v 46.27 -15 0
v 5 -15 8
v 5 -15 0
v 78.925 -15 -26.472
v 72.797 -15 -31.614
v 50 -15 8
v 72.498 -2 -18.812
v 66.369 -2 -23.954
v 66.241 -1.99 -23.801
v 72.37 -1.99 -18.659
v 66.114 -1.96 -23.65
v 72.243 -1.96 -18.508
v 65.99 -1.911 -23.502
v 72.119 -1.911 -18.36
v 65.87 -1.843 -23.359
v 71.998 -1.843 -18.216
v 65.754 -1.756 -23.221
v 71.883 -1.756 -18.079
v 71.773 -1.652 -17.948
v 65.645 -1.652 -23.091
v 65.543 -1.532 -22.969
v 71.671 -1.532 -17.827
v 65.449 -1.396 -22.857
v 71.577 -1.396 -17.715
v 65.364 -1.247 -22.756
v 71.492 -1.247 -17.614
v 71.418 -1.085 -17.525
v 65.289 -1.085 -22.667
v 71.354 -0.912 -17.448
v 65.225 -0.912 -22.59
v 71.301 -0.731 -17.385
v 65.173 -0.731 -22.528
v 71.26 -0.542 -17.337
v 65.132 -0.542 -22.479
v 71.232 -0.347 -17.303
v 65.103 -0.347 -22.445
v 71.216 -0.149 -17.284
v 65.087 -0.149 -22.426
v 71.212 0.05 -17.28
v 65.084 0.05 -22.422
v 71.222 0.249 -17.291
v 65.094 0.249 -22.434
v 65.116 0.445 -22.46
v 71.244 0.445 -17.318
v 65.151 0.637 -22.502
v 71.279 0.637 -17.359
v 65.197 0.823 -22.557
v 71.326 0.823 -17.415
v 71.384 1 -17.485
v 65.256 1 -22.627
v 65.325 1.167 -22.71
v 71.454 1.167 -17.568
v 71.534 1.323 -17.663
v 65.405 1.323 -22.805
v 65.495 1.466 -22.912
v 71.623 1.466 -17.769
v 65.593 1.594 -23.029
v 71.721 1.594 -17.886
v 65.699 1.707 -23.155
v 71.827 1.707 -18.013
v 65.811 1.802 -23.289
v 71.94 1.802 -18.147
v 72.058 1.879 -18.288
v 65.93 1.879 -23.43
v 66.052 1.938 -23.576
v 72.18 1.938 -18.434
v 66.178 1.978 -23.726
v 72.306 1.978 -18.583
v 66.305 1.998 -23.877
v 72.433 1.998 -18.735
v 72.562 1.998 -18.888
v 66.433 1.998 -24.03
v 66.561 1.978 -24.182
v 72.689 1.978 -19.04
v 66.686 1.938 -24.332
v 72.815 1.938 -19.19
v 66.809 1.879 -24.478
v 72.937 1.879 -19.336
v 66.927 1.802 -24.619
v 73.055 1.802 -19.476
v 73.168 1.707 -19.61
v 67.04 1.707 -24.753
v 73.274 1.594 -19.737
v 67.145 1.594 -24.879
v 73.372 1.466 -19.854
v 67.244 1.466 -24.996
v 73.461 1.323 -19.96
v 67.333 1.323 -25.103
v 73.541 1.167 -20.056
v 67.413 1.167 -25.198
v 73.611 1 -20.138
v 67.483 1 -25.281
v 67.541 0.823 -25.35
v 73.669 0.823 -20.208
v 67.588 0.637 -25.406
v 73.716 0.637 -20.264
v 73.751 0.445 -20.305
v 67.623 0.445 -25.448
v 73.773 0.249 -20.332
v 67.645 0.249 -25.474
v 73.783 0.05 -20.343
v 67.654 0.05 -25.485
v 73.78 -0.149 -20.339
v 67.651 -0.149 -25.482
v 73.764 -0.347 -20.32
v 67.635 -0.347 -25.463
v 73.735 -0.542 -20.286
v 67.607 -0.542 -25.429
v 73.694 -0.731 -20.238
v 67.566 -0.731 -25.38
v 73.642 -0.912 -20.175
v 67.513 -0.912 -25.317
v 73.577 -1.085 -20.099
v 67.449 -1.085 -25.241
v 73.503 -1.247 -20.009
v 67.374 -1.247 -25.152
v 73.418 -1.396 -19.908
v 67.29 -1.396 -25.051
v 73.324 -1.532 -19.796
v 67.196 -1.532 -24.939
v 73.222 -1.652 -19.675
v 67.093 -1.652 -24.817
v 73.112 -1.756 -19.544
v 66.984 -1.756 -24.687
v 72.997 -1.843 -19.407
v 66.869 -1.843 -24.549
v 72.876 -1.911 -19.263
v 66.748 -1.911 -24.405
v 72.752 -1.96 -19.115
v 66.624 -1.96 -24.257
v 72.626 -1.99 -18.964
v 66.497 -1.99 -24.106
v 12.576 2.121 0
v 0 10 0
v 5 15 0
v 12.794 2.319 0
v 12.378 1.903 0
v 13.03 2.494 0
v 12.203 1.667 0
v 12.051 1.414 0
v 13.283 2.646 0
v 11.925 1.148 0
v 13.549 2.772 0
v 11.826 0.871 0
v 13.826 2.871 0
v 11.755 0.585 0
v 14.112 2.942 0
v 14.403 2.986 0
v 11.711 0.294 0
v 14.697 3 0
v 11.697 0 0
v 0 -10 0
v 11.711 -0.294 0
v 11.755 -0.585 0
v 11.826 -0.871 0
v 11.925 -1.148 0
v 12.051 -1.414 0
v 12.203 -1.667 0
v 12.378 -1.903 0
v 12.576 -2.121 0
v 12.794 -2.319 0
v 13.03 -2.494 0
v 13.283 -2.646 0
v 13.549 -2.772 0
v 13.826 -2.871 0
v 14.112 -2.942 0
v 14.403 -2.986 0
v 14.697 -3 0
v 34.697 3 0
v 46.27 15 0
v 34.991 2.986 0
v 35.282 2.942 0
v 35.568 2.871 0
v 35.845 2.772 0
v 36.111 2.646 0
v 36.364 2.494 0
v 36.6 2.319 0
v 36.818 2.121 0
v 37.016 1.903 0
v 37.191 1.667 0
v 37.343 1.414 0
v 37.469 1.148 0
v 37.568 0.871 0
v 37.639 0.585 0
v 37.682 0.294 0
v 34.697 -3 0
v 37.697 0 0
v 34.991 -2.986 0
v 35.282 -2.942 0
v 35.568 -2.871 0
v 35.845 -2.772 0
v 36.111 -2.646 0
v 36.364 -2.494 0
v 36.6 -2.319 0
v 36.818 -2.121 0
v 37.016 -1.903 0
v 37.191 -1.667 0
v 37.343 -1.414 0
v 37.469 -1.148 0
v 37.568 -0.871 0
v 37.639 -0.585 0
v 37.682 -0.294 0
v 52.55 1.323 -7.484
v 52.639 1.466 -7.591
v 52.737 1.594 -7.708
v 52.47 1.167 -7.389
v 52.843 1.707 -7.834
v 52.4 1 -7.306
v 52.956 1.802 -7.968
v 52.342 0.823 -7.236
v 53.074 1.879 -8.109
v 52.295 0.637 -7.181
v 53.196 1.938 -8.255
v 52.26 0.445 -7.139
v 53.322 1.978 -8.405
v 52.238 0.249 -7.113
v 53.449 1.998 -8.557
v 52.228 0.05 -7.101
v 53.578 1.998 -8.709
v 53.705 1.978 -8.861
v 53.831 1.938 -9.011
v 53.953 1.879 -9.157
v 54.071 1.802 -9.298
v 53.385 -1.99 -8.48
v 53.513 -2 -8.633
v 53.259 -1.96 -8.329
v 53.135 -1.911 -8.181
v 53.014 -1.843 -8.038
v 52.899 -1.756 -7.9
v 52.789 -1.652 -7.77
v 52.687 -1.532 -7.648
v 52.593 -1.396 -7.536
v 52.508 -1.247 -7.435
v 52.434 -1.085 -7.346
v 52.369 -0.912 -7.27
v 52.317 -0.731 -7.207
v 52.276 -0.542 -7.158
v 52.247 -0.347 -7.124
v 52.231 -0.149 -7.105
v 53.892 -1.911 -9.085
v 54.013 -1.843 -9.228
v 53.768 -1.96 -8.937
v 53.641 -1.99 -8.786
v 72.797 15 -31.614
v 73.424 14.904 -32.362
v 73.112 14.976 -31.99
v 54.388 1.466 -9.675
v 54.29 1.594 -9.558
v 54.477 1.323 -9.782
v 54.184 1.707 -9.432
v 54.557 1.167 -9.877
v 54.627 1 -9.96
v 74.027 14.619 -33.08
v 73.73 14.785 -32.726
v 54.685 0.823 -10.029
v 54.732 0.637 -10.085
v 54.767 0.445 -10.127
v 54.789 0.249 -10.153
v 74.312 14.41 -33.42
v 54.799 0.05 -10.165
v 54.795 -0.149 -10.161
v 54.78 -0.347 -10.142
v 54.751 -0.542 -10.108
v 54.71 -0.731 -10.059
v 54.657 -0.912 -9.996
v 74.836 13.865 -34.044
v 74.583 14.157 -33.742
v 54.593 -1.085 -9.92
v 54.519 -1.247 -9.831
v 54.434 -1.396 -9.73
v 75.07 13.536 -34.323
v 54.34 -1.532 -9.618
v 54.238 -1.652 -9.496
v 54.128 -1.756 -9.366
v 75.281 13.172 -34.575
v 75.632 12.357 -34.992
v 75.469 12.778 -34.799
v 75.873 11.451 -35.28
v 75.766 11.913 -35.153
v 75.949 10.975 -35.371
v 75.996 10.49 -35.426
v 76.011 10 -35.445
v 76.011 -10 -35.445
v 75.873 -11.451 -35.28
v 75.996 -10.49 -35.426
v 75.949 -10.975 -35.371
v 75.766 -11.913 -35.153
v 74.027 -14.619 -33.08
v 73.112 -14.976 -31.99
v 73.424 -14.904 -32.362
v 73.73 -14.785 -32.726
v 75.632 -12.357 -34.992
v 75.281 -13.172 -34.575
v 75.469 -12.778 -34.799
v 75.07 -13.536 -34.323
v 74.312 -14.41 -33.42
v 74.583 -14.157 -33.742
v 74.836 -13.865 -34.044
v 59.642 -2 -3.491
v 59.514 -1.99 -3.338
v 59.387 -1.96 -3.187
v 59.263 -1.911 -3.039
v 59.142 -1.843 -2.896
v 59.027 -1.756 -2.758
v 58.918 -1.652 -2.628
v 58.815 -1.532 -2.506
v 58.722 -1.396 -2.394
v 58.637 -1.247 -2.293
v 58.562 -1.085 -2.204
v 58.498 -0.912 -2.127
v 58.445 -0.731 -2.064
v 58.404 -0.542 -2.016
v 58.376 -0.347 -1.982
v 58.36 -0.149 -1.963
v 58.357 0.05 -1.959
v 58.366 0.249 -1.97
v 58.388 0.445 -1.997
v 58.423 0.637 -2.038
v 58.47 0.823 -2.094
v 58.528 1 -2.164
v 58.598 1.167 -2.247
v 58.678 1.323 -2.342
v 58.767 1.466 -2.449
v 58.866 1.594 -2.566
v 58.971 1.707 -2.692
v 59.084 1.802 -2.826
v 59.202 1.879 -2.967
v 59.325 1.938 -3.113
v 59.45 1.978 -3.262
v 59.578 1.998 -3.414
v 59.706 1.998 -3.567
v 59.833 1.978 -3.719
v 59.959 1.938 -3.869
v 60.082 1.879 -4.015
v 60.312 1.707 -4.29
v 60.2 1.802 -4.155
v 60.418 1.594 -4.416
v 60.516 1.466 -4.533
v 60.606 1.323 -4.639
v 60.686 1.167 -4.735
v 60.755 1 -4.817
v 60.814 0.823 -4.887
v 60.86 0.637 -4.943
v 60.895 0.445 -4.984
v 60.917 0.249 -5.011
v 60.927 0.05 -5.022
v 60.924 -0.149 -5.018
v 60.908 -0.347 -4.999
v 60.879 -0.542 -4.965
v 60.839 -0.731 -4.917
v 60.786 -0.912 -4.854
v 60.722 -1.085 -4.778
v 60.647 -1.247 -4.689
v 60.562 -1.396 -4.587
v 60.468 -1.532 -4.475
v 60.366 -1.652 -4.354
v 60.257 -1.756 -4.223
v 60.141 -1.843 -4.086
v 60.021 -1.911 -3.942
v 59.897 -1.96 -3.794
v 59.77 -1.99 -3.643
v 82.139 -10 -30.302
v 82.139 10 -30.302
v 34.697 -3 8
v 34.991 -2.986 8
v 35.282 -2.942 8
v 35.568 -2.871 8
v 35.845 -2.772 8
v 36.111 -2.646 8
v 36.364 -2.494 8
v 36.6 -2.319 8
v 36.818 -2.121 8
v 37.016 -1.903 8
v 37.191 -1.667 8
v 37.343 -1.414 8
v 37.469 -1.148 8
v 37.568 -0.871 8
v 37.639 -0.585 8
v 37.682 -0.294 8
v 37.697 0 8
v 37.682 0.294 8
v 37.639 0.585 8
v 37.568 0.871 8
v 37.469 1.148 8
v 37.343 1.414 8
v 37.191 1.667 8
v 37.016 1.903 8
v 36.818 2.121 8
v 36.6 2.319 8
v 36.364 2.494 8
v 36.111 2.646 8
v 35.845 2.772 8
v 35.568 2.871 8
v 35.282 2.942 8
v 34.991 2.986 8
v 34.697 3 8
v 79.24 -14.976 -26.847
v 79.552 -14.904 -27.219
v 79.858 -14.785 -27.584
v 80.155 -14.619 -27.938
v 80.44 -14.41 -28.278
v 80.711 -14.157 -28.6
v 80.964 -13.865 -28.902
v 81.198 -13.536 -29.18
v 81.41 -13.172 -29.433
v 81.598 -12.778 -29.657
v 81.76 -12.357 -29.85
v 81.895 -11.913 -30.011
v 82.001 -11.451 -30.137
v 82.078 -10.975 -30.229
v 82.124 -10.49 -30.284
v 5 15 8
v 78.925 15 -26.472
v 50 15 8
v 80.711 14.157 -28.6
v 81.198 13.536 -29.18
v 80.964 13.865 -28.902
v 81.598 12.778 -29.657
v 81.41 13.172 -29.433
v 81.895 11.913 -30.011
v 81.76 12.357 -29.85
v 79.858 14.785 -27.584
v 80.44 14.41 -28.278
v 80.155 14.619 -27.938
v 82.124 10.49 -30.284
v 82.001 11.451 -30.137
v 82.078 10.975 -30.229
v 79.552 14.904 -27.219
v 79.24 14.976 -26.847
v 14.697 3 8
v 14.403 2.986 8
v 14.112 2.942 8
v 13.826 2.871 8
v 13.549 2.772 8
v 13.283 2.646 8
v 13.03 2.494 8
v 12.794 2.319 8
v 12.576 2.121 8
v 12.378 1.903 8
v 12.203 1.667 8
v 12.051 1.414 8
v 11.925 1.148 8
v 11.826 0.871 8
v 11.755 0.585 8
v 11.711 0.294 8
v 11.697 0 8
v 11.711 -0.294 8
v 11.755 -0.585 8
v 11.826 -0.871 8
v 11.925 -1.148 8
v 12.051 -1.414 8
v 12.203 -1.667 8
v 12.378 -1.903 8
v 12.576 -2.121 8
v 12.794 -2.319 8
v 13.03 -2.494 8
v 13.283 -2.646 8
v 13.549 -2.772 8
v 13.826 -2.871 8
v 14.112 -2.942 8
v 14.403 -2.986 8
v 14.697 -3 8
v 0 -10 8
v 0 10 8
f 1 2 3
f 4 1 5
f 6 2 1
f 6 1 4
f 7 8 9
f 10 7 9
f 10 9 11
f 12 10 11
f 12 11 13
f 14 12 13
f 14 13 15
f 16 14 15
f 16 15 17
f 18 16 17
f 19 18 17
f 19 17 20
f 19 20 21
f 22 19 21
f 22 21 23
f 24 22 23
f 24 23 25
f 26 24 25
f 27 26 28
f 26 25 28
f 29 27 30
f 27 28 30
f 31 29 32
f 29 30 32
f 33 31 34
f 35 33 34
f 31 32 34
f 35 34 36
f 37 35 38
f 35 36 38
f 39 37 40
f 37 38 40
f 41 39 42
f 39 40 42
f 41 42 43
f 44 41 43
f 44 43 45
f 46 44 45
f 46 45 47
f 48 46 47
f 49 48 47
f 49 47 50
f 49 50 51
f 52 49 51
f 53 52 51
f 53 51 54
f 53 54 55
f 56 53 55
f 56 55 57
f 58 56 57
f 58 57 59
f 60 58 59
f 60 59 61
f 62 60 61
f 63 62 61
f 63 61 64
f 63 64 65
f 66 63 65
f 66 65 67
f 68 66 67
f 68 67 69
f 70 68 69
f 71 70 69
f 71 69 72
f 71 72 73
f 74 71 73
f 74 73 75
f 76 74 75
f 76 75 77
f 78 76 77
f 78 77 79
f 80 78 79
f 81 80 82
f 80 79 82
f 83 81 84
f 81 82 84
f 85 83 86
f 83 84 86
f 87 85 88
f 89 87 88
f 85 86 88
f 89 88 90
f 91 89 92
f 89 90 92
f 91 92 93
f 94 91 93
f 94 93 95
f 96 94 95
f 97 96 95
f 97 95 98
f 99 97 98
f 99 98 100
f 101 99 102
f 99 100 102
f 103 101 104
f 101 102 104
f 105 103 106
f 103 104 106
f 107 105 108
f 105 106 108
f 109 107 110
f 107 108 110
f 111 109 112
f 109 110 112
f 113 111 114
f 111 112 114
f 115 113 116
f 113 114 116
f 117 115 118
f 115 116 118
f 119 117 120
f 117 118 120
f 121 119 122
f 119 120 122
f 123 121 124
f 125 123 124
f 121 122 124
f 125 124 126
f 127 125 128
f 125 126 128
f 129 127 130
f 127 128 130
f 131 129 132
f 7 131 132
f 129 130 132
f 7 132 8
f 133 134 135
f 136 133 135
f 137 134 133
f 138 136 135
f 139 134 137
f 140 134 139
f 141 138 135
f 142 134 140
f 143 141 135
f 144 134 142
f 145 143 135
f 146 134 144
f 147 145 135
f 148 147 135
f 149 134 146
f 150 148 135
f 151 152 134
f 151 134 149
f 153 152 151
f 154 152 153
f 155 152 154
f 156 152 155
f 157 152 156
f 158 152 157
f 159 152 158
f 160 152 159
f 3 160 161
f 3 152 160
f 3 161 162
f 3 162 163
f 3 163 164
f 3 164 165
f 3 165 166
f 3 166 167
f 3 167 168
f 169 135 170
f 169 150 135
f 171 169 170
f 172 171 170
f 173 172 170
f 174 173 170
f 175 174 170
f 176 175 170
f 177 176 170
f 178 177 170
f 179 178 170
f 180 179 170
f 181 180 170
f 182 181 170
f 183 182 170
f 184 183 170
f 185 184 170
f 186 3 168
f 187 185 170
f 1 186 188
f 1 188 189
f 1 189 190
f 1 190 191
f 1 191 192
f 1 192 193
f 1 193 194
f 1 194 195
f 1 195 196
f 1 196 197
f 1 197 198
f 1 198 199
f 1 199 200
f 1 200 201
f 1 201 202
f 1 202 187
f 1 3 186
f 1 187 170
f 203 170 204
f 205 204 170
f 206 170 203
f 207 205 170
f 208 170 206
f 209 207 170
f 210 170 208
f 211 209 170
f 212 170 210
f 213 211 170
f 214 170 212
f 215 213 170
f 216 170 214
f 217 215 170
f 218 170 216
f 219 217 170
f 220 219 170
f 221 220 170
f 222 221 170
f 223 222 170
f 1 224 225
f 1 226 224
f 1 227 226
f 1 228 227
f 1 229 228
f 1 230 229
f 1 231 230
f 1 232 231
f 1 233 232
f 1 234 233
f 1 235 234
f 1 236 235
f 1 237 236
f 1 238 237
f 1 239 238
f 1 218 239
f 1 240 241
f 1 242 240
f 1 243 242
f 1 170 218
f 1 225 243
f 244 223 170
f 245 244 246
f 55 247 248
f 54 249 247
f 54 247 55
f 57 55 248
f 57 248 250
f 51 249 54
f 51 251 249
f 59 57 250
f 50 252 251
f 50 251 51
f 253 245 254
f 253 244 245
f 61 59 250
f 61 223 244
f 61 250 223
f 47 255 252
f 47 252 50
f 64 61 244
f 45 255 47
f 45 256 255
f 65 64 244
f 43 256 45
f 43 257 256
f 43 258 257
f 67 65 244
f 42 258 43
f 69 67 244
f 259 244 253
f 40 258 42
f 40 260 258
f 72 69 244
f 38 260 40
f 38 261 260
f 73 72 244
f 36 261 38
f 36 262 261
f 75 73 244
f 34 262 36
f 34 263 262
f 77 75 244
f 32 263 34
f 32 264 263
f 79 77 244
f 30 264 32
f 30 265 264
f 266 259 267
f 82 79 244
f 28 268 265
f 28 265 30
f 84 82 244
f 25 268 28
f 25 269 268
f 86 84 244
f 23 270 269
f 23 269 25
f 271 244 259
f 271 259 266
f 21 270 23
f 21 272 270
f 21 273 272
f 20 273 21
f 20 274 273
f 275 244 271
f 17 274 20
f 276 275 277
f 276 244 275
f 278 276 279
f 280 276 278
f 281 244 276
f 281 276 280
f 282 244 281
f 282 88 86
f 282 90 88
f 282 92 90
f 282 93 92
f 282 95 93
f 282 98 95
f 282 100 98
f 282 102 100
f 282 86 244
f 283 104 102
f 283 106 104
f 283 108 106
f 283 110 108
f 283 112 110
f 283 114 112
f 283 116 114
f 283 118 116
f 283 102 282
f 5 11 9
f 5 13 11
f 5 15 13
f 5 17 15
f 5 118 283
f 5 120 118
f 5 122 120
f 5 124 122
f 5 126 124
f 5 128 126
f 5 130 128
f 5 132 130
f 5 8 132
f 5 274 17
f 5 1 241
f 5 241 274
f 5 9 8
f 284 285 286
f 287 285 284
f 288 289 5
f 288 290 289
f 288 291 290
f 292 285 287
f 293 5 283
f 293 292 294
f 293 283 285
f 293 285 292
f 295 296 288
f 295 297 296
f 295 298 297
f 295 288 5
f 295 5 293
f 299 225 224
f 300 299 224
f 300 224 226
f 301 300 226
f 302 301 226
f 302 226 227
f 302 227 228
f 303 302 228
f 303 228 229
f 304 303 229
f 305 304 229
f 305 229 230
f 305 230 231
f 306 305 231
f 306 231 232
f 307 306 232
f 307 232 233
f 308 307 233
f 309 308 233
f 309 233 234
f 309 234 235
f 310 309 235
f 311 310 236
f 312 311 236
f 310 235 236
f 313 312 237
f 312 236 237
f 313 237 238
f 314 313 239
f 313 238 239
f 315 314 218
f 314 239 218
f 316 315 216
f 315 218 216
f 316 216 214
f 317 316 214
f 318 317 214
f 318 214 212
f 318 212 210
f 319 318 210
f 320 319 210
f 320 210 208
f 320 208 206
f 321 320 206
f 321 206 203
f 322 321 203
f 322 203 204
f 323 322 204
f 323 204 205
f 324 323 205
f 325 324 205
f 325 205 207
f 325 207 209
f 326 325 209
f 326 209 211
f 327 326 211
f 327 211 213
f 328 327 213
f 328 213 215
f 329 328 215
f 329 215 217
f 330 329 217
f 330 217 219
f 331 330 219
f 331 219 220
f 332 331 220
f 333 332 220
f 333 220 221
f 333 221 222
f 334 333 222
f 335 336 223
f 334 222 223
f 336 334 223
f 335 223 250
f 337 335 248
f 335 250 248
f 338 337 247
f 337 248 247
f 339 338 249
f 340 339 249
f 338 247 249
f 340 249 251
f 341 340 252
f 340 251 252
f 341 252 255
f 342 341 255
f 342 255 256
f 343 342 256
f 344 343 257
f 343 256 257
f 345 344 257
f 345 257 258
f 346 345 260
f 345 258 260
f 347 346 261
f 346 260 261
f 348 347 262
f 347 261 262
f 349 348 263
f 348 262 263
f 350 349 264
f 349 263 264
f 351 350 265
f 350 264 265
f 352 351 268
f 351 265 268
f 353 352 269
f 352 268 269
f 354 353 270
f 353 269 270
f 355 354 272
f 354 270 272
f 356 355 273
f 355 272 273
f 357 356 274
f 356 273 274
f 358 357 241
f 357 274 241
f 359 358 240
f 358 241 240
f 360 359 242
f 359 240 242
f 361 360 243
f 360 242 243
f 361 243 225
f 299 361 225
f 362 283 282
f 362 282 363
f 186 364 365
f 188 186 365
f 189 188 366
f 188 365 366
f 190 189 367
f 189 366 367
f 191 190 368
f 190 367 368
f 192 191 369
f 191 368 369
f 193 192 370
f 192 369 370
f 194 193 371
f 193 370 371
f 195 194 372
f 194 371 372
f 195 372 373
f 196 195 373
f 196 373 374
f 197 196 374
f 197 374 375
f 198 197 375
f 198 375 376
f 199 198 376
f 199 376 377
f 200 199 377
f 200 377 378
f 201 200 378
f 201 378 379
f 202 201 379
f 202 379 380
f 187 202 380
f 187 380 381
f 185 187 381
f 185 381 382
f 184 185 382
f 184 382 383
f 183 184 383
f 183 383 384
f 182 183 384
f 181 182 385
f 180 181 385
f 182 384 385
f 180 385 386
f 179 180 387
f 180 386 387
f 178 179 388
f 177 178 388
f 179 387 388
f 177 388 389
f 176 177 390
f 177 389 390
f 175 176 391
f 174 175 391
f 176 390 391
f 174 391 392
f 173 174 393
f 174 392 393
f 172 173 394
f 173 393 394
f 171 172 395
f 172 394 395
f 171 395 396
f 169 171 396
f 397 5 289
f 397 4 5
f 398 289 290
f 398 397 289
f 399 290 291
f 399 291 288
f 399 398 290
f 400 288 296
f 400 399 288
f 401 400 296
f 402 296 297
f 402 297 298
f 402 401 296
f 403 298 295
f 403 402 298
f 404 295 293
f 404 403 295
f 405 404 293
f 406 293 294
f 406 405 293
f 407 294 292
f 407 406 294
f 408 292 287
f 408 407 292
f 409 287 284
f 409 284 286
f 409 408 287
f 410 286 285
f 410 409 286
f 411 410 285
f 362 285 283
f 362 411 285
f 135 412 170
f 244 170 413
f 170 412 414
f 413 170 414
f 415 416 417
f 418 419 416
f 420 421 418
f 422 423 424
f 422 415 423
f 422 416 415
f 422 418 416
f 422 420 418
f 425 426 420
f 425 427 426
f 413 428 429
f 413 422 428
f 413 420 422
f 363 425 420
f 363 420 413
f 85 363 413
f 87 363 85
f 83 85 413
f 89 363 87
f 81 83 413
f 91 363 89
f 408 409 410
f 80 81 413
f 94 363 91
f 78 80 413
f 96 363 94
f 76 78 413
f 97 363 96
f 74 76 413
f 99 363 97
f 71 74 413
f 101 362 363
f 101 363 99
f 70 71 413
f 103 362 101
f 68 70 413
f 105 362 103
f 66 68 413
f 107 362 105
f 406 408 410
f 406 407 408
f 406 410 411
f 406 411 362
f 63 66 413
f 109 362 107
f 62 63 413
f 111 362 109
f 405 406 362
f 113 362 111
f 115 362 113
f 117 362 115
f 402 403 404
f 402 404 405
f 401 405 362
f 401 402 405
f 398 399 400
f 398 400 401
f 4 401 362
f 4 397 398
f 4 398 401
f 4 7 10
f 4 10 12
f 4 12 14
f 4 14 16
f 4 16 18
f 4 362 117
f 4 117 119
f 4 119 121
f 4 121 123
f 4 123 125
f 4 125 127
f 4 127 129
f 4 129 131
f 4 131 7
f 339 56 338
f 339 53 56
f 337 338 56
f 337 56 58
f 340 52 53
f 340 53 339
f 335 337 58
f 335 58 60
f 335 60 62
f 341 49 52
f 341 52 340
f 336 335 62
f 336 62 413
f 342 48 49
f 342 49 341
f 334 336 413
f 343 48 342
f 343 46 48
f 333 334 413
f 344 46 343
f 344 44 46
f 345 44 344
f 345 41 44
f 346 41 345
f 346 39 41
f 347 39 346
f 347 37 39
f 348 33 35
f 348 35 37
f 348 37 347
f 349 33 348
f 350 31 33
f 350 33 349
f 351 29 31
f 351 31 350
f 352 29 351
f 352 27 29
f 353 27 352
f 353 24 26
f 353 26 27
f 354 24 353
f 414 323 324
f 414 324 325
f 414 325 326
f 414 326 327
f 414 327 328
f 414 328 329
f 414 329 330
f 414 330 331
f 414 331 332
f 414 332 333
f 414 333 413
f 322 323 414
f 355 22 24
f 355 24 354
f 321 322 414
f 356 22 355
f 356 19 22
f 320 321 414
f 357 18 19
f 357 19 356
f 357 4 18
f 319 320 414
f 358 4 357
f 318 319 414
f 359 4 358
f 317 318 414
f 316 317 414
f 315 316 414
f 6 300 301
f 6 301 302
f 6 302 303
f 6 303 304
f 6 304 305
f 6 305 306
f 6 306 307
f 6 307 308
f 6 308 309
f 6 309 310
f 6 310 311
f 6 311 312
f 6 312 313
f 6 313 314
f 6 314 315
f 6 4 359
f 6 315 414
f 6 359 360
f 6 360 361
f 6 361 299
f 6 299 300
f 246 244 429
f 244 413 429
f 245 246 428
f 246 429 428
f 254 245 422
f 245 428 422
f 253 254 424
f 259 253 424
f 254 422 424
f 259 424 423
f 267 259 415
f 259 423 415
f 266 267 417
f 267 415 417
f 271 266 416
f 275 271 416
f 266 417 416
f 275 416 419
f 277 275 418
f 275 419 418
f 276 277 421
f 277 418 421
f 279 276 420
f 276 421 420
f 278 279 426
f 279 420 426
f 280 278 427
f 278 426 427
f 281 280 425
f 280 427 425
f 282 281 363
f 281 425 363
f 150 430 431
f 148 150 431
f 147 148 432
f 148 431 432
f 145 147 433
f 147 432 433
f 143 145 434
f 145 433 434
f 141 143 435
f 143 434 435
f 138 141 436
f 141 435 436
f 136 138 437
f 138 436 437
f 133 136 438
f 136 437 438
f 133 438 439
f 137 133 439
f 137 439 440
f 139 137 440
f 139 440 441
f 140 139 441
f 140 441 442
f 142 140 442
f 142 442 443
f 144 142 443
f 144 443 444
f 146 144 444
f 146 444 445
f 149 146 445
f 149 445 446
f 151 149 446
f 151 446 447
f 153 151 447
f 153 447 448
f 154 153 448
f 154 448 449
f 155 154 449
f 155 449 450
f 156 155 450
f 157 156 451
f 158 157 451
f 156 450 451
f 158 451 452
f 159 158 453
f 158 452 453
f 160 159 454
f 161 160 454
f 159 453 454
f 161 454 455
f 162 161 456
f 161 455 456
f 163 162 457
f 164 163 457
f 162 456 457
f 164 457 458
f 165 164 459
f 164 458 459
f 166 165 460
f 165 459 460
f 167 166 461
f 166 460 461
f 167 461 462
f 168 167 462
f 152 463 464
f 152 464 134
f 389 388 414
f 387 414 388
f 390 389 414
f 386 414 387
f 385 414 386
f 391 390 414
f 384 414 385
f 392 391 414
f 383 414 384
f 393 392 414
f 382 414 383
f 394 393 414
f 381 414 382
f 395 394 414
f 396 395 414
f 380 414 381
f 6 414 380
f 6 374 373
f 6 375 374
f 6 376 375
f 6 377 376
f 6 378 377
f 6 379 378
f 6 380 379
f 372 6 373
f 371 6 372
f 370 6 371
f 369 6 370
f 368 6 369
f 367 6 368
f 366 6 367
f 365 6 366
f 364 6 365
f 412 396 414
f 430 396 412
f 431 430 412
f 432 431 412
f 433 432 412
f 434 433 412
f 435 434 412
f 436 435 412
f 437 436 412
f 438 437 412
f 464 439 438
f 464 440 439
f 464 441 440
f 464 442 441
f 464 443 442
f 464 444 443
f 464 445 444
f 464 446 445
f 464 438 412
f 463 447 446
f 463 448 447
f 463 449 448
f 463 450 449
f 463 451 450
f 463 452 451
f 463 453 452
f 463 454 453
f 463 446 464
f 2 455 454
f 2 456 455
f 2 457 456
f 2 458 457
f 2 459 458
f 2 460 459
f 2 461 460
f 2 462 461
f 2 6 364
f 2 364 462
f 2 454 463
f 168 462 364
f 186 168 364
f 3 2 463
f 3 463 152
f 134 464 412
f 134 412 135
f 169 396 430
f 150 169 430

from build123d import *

# Parameters (mm, degrees)
F1_DEPTH = 15
F3_DEPTH = 43.4455230334
F5_D     = 4
F6_R     = 5
F7_SIZE  = 5


with BuildPart() as f1:
    # F0 (on Front) → F1 (new body, symmetric)
    with BuildSketch(Plane.XZ):
        Polygon((0, 8), (0, 0), (46.2695387348, 0), (76.0110249394, -35.4445230334), (82.1393804843, -30.3022221559), (50, 8), align=None)
    extrude(amount=F1_DEPTH, both=True)

    # F2 (on face) → F3 (cut, through all)
    with BuildSketch(Plane.XY.offset(8)):
        with BuildLine():
            ThreePointArc((14.6969384567, 3), (11.6969384567, 0), (14.6969384567, -3))
            Line((14.6969384567, -3), (34.6969384567, -3))
            ThreePointArc((34.6969384567, -3), (37.6969384567, 0), (34.6969384567, 3))
            Line((34.6969384567, 3), (14.6969384567, 3))
        make_face()
    extrude(amount=-F3_DEPTH, mode=Mode.SUBTRACT)

    # F5 (through all)
    with Locations(Plane(origin=(33.2804354537, 0, 27.9256011146), x_dir=(0, 1, 0), z_dir=(0.7660444431, 0, 0.6427876097))):
        with Locations((0, -41.0110249394), (0, -61.0110249394)):
            Hole(F5_D / 2)

    # F6
    f6_edges = [f1.edges().sort_by_distance(p)[0] for p in [
        (79.075203, -15, -32.873373),
        (79.075203, 15, -32.873373),
    ]]
    fillet(f6_edges, radius=F6_R)

    # F7
    f7_edges = [f1.edges().sort_by_distance(p)[0] for p in [
        (0, -15, 4),
        (0, 15, 4),
    ]]
    chamfer(f7_edges, length=F7_SIZE)


solid = f1.part
